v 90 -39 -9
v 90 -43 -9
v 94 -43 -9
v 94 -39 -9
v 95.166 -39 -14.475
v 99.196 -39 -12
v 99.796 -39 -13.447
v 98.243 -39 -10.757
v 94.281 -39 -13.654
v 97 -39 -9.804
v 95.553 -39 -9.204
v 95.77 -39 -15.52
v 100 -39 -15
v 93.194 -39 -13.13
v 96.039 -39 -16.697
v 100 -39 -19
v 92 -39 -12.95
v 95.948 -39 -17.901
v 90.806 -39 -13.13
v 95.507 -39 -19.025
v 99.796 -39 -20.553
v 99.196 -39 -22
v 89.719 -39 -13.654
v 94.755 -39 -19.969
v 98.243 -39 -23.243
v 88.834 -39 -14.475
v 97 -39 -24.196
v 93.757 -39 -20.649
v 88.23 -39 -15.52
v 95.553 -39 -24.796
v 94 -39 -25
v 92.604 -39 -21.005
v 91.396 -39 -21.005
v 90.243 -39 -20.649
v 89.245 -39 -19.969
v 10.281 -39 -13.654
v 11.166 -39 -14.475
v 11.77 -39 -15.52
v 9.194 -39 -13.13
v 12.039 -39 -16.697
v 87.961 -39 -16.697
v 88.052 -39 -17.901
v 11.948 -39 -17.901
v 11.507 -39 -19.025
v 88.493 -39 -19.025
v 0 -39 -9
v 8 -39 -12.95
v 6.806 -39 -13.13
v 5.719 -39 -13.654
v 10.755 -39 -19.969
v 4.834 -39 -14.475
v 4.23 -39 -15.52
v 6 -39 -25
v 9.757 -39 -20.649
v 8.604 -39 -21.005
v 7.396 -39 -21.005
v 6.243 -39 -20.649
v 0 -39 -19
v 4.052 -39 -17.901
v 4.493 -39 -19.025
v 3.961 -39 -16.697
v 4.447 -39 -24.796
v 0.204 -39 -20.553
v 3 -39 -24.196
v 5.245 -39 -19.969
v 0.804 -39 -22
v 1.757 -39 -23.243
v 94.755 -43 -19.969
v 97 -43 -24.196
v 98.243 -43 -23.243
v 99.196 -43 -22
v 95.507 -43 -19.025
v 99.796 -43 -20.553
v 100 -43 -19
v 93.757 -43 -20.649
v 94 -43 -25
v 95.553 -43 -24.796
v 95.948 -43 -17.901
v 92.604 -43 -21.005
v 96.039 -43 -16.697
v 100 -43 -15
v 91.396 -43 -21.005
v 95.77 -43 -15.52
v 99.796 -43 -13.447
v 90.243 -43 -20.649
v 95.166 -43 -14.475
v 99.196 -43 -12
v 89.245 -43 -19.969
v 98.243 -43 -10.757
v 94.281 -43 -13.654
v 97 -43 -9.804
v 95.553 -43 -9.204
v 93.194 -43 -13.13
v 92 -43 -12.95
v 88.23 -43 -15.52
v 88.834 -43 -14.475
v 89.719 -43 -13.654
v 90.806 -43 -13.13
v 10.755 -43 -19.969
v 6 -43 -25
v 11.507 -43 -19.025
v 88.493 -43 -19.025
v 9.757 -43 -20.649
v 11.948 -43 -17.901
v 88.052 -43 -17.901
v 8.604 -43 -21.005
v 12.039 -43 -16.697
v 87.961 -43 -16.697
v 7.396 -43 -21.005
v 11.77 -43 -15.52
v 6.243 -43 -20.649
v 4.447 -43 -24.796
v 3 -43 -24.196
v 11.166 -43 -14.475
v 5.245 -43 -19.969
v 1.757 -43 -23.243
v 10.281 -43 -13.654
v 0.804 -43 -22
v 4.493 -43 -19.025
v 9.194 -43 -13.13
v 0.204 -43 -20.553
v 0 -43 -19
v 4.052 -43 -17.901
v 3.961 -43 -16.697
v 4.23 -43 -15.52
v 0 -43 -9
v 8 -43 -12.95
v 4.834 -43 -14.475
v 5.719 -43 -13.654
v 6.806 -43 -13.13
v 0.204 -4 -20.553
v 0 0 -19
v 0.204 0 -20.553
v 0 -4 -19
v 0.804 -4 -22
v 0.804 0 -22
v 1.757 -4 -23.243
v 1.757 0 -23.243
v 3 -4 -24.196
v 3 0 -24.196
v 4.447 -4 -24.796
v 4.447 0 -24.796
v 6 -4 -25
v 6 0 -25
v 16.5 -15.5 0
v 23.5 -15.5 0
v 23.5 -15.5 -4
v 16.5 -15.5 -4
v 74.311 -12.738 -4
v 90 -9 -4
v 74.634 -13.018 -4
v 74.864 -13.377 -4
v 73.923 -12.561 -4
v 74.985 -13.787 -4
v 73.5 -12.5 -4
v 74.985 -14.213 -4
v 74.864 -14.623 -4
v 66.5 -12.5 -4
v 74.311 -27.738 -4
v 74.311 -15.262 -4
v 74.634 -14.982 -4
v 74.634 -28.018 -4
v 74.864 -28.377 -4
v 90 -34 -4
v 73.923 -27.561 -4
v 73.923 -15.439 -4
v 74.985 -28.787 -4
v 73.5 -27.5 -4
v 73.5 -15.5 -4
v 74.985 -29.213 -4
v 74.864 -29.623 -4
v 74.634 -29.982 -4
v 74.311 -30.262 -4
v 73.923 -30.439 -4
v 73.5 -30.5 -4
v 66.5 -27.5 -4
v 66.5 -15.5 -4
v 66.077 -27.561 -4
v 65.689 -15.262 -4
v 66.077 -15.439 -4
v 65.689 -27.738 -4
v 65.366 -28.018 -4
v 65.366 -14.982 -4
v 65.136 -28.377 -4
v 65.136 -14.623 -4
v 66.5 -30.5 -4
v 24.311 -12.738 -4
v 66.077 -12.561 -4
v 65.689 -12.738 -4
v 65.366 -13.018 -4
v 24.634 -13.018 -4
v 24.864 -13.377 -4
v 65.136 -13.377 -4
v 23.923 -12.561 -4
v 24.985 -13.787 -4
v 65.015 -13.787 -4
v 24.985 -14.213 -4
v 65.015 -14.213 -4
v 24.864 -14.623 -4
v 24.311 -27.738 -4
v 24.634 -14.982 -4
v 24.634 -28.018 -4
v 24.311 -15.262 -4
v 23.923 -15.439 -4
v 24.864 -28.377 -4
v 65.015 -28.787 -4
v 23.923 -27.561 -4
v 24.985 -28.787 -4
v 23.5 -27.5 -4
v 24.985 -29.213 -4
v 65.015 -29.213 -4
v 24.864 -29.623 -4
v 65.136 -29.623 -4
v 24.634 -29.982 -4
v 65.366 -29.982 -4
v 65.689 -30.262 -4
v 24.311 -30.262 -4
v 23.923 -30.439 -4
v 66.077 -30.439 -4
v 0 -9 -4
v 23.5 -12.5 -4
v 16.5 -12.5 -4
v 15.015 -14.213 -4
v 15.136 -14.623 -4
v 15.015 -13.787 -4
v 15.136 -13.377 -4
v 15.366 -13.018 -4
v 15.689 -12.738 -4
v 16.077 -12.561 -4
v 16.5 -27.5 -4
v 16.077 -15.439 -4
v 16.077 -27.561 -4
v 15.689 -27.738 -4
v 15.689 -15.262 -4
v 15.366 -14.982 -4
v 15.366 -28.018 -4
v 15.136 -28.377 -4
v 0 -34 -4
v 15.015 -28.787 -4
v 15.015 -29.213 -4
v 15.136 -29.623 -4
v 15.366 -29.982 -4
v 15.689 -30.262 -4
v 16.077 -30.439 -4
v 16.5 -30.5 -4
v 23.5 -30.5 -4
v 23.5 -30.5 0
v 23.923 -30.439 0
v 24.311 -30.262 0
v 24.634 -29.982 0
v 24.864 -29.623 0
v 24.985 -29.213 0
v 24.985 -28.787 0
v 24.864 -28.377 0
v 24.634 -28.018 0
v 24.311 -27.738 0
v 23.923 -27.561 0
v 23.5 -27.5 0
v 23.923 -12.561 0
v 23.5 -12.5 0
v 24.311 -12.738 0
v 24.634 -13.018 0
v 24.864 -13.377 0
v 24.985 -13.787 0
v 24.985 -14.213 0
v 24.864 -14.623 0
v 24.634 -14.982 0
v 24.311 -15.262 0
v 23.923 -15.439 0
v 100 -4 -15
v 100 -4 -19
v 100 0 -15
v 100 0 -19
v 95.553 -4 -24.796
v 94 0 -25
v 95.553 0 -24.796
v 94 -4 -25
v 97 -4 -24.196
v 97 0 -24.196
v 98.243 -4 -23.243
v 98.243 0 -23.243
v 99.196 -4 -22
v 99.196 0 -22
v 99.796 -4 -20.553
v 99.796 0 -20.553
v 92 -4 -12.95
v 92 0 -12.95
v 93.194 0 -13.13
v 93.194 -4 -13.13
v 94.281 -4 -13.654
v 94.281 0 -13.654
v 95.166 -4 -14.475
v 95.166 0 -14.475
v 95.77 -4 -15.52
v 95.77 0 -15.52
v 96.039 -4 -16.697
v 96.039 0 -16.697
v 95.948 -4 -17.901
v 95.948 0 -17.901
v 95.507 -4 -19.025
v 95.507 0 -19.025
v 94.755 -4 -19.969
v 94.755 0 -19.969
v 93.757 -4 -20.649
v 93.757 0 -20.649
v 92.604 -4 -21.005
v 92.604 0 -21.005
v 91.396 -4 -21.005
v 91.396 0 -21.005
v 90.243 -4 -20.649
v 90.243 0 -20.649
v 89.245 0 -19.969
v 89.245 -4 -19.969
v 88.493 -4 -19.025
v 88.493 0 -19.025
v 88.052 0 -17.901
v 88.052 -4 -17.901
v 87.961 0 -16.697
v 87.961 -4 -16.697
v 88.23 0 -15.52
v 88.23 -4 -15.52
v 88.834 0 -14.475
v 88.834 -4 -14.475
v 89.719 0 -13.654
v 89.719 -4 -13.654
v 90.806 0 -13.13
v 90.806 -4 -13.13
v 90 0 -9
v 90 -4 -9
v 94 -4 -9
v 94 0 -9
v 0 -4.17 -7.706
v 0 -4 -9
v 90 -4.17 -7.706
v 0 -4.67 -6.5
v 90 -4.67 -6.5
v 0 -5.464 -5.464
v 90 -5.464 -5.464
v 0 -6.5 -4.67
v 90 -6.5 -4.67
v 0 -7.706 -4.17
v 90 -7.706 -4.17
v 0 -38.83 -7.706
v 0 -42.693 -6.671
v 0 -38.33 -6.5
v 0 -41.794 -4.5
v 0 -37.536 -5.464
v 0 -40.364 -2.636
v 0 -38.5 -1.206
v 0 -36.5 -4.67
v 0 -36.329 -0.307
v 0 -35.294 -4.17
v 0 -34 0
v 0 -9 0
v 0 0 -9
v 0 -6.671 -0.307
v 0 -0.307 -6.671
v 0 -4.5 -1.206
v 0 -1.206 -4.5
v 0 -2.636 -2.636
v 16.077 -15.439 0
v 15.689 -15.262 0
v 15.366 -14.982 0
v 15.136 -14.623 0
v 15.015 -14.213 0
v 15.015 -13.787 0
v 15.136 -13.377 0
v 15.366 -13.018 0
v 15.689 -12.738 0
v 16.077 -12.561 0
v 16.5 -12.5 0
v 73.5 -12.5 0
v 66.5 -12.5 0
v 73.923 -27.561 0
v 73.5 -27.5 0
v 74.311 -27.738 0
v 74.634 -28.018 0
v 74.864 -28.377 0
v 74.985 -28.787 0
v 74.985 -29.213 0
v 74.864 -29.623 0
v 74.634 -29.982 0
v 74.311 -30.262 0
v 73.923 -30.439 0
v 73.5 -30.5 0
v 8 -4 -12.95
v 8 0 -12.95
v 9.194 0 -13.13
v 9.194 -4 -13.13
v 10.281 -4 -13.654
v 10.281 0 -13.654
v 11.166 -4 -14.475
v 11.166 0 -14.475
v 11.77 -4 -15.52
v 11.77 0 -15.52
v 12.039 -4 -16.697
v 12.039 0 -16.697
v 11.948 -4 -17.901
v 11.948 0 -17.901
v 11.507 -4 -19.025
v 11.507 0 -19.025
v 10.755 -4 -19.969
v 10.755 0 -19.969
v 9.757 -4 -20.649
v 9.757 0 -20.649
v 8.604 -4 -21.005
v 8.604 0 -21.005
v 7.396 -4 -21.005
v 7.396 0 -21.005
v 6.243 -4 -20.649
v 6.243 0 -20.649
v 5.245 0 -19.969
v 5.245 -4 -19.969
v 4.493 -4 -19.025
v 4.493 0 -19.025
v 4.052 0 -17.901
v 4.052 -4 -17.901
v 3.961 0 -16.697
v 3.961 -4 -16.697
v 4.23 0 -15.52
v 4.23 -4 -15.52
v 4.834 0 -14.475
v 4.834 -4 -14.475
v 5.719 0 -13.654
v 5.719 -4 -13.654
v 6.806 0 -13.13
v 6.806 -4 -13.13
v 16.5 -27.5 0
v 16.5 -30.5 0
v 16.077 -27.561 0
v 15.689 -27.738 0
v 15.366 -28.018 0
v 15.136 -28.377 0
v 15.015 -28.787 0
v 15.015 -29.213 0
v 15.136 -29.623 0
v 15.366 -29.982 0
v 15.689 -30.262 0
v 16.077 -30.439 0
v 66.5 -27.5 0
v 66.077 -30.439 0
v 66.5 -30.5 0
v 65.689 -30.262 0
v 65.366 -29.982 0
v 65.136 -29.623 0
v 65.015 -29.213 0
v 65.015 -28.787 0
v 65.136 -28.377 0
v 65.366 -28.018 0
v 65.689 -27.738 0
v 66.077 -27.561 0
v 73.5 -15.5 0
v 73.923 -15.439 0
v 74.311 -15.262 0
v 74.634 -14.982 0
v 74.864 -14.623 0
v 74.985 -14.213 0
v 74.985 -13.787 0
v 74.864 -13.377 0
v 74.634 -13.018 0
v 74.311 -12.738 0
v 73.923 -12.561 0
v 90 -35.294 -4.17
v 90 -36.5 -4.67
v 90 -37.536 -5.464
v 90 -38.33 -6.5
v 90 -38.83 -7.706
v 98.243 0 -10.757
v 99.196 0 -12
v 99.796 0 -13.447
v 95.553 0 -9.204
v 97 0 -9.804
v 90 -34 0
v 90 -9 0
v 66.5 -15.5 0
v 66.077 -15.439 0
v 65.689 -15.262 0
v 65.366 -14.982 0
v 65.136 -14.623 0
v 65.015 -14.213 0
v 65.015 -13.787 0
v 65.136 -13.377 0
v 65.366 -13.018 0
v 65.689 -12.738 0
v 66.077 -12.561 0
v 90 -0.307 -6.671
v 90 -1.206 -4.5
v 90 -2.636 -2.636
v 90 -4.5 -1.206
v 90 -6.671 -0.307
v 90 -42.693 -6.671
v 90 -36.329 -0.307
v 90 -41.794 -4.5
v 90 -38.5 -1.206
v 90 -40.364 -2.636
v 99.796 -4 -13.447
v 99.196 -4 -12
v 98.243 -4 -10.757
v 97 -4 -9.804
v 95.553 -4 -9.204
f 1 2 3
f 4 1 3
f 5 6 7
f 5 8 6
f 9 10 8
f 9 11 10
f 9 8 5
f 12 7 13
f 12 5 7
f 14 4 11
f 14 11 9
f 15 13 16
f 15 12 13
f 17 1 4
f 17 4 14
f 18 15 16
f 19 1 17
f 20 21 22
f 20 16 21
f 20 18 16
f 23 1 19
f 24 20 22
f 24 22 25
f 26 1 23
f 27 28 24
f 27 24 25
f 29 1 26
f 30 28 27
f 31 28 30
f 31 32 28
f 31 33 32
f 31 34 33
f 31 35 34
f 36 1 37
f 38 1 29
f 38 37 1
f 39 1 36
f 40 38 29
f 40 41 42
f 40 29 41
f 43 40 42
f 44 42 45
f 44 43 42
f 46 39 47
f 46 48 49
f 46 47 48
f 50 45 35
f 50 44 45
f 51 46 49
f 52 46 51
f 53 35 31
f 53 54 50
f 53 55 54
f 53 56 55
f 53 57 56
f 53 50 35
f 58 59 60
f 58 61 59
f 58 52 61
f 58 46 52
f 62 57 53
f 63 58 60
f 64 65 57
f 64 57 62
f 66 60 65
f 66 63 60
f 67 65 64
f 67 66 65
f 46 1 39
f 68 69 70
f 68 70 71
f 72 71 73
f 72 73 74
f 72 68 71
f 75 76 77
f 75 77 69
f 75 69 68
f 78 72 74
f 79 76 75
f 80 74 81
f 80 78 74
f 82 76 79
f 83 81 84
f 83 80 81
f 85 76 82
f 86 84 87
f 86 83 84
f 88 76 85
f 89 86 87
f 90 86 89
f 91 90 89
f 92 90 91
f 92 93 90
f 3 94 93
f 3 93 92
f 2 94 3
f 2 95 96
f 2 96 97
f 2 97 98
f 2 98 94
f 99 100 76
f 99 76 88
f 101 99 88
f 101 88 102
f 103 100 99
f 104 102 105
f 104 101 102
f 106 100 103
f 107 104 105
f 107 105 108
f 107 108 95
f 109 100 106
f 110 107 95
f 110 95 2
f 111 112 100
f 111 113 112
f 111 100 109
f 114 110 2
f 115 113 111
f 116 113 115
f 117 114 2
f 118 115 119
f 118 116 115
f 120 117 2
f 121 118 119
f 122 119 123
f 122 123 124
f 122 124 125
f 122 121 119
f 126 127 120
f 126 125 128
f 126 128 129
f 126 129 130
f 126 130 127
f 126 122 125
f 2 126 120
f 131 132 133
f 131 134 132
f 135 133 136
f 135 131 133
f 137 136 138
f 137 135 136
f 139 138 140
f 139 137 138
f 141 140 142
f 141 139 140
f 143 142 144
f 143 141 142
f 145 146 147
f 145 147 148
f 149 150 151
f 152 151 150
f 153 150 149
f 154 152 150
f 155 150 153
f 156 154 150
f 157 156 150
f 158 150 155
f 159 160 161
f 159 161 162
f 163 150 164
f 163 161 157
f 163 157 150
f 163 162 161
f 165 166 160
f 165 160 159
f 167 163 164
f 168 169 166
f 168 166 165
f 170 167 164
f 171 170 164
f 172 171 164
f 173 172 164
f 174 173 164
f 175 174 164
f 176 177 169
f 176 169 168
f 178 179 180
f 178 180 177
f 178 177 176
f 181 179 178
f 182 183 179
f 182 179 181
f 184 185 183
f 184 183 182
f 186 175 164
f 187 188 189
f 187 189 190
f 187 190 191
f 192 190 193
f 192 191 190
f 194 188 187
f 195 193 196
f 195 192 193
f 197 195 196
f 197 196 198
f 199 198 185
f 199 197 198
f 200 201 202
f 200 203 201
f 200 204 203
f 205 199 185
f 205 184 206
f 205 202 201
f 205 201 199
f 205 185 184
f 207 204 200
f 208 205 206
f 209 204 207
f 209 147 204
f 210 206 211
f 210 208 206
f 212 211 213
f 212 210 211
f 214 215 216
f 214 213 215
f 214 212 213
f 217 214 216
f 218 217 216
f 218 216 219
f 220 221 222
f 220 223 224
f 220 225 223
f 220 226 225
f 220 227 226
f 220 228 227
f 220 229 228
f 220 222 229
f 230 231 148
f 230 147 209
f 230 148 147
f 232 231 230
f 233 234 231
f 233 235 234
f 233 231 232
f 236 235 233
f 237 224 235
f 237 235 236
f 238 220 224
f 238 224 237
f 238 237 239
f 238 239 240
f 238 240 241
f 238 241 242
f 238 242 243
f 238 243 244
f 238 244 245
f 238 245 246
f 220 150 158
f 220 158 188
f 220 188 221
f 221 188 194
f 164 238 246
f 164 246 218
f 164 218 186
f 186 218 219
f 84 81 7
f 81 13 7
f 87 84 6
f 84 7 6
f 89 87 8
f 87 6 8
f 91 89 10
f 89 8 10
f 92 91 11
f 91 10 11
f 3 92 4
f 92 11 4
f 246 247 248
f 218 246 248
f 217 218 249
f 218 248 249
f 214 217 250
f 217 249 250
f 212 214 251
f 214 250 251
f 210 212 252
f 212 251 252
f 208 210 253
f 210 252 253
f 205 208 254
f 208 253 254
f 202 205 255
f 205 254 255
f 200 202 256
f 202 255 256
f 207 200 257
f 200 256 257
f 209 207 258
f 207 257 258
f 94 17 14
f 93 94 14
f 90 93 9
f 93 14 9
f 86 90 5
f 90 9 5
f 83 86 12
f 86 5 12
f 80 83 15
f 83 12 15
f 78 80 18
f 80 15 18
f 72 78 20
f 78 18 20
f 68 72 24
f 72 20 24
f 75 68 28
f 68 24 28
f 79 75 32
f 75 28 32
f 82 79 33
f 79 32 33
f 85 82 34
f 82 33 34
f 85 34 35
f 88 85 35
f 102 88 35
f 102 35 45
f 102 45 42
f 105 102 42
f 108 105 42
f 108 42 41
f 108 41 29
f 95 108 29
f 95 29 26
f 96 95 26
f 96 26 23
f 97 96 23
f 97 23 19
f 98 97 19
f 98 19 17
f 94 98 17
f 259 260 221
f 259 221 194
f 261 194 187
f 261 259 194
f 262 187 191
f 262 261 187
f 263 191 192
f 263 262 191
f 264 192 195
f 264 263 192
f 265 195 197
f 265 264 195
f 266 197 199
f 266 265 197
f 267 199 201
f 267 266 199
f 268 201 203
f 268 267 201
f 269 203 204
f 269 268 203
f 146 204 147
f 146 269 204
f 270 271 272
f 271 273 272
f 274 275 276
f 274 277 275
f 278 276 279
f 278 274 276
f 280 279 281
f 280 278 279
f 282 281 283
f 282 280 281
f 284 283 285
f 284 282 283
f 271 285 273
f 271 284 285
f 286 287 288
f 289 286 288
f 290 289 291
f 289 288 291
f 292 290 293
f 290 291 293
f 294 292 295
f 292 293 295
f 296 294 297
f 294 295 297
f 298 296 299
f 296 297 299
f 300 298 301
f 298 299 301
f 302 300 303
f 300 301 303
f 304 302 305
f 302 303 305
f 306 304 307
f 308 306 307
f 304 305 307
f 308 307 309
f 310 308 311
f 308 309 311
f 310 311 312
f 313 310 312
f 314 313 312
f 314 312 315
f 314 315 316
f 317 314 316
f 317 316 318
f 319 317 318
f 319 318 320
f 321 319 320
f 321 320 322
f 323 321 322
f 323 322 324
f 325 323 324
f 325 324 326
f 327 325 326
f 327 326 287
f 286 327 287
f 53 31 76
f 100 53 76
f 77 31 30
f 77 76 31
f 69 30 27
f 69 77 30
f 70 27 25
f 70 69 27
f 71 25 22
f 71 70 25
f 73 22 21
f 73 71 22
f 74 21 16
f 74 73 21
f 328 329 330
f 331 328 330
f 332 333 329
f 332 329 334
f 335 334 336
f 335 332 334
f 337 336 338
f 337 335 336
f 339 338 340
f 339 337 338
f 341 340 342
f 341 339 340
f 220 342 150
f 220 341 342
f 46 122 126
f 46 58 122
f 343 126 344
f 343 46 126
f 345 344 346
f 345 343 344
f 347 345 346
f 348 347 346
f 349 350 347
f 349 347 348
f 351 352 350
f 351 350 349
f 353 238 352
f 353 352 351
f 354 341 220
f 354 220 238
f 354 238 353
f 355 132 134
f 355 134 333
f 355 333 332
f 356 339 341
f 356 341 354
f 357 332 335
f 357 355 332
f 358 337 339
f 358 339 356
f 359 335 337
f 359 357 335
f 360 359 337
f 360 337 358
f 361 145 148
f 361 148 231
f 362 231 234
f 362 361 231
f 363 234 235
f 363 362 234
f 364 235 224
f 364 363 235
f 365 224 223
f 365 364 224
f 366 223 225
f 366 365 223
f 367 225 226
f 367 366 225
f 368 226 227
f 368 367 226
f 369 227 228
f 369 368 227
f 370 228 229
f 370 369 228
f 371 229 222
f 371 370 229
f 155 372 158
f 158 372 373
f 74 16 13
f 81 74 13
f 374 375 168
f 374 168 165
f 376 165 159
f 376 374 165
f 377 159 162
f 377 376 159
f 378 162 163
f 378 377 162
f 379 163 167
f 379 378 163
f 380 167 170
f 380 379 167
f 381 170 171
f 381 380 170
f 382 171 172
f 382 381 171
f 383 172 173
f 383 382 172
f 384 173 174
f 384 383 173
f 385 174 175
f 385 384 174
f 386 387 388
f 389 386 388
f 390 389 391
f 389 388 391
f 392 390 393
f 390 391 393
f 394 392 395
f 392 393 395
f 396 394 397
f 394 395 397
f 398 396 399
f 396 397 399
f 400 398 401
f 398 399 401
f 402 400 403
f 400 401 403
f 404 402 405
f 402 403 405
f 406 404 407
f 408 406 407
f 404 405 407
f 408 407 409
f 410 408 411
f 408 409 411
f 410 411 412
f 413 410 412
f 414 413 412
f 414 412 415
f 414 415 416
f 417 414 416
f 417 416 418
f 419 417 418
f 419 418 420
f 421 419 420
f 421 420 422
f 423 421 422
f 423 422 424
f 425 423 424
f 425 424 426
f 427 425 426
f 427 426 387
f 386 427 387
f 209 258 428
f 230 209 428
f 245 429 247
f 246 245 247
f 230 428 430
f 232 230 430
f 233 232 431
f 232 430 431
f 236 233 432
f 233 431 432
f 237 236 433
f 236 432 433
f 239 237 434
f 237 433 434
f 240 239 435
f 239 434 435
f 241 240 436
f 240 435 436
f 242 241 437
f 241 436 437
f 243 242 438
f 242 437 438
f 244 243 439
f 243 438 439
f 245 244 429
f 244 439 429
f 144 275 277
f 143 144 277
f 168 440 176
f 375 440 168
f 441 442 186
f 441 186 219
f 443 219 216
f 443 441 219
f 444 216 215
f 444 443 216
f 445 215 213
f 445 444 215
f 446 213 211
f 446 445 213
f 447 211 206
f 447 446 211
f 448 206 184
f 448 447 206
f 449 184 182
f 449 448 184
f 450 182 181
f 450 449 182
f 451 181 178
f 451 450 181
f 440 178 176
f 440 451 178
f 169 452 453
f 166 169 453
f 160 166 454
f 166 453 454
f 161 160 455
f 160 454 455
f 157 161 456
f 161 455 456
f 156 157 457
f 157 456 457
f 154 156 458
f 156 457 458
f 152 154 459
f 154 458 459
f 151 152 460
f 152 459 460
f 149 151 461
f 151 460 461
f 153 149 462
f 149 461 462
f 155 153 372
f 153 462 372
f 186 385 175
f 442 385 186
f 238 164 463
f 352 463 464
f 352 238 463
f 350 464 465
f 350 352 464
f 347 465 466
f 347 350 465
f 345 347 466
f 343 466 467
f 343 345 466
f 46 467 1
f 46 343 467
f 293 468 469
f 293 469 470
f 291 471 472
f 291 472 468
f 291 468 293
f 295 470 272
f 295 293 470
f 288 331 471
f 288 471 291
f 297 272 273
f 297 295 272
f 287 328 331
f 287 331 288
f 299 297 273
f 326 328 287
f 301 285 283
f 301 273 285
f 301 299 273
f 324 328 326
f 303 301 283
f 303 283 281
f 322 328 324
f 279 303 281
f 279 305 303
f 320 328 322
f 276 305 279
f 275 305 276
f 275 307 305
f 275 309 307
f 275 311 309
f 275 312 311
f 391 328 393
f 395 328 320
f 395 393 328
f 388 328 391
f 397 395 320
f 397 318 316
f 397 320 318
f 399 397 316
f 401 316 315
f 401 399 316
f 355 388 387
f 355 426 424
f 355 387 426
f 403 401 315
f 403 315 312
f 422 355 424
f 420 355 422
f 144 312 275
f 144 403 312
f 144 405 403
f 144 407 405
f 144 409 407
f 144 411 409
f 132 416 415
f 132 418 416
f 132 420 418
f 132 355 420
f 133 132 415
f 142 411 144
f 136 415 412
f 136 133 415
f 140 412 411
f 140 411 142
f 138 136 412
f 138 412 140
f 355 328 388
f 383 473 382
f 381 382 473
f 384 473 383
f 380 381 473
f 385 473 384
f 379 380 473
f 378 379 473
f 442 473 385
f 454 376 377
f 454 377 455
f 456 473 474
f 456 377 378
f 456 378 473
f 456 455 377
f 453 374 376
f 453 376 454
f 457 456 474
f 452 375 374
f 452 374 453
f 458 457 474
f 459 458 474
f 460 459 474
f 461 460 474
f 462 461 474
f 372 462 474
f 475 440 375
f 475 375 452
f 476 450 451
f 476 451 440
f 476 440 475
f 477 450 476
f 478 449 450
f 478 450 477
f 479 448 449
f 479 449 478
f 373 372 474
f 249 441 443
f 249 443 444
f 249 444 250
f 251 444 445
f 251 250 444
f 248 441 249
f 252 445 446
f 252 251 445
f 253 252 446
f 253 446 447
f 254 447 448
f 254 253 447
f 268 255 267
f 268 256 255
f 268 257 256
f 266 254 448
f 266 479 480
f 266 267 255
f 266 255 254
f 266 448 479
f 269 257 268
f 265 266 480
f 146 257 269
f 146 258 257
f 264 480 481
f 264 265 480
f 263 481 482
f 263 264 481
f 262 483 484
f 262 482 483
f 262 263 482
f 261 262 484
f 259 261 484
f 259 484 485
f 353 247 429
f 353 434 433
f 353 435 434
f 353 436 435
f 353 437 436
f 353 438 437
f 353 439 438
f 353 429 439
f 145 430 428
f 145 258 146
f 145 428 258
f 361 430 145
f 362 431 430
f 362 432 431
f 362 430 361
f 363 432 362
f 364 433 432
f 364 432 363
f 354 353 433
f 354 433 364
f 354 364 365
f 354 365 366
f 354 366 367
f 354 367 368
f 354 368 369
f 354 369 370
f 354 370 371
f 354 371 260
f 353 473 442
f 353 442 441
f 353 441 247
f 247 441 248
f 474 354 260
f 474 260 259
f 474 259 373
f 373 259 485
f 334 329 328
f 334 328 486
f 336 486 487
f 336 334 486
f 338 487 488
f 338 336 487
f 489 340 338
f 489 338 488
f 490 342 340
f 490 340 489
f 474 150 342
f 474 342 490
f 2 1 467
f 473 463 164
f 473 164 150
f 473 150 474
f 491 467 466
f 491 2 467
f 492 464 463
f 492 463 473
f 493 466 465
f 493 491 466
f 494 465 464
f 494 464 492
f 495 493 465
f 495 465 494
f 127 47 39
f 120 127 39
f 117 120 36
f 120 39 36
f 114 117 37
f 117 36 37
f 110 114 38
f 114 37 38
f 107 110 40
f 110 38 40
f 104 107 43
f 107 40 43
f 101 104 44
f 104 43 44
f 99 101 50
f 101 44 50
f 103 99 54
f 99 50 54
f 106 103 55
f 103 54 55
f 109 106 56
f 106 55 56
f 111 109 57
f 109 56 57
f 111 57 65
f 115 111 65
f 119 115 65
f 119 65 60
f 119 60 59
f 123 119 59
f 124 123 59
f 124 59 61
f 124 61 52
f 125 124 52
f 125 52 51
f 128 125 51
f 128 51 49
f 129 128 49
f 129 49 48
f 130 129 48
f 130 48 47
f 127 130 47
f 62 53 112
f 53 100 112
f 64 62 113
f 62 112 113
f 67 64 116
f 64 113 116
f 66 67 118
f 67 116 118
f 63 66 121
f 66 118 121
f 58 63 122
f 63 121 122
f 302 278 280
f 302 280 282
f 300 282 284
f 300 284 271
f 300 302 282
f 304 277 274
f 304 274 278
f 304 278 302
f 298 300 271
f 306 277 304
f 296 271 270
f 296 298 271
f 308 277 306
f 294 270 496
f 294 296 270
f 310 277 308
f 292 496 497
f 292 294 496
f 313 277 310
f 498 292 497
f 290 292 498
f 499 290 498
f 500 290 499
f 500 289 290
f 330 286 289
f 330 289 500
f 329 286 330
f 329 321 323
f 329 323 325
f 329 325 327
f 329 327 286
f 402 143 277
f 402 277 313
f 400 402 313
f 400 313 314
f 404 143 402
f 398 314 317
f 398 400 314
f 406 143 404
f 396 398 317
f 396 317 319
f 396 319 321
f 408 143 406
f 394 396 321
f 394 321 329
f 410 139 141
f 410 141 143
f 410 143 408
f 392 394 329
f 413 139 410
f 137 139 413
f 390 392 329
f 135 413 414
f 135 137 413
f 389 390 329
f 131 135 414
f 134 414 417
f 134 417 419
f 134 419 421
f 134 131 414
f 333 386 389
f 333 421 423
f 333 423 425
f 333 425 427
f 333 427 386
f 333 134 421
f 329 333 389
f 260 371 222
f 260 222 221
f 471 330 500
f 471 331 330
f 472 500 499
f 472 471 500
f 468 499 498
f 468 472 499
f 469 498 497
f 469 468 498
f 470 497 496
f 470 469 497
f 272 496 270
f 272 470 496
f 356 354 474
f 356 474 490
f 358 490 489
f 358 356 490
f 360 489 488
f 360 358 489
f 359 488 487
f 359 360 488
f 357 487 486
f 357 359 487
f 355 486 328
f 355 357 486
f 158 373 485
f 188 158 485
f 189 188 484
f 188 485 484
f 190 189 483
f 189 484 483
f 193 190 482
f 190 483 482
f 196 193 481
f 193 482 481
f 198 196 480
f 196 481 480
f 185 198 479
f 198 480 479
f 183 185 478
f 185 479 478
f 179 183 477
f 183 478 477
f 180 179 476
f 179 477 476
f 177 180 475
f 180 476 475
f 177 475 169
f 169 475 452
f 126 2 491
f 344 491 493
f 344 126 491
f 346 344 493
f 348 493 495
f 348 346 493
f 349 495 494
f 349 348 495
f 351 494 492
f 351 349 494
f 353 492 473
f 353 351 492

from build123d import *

# Parameters (mm, degrees)
SM_BASE_FLANGE_1_DEPTH = 100
SKETCH_4_R             = 4.05
CUT_EXTRUDE_1_DEPTH    = 112.687062814
SKETCH_5_W             = 10
SKETCH_5_H             = 9
CUT_EXTRUDE_2_DEPTH    = 112.687062814
FILLET_1_R             = 6
CUT_EXTRUDE_3_DEPTH    = 4


# Sheet-metal steps are written as plain solids
with BuildPart() as part:
    # Sketch 1 → Базовая кромка1 (new body)
    with BuildSketch(Plane(origin=(0, 0, 0), x_dir=(0, 0, -1), z_dir=(1, 0, 0))):
        with BuildLine():
            Line((25, -43), (9, -43))
            ThreePointArc((9, -43), (2.636038969, -40.363961031), (0, -34))
            Line((0, -34), (0, -9))
            ThreePointArc((0, -9), (2.636038969, -2.636038969), (9, 0))
            Line((9, 0), (25, 0))
            Line((25, 0), (25, -4))
            Line((25, -4), (9, -4))
            ThreePointArc((9, -4), (5.464466094, -5.464466094), (4, -9))
            Line((4, -9), (4, -34))
            ThreePointArc((4, -34), (5.464466094, -37.535533906), (9, -39))
            Line((9, -39), (25, -39))
            Line((25, -39), (25, -43))
        make_face()
    extrude(amount=SM_BASE_FLANGE_1_DEPTH)

    # Эскиз4 → Вырез-Вытянуть1 (cut, through all)
    with BuildSketch(Plane(origin=(0, 0, 0), x_dir=(1, 0, 0), z_dir=(0, 1, 0))):
        with Locations(Location((8, 17, 0), (0, 0, 270))):
            Circle(SKETCH_4_R)
        with Locations(Location((92, 17, 0), (0, 0, 270))):
            Circle(SKETCH_4_R)
    extrude(amount=-CUT_EXTRUDE_1_DEPTH, mode=Mode.SUBTRACT)

    # Эскиз5 → Вырез-Вытянуть2 (cut, through all)
    with BuildSketch(Plane.XZ.offset(43)):
        with Locations((95, -4.5)):
            Rectangle(SKETCH_5_W, SKETCH_5_H)
    extrude(amount=-CUT_EXTRUDE_2_DEPTH, mode=Mode.SUBTRACT)

    # Скругление1
    fillet_1_edges = [part.edges().sort_by_distance(p)[0] for p in [
        (0, -41, -25),
        (0, -2, -25),
        (100, -41, -25),
        (100, -2, -9),
        (100, -41, -9),
        (100, -2, -25),
    ]]
    fillet(fillet_1_edges, radius=FILLET_1_R)

    # Эскиз6 → Вырез-Вытянуть3 (cut)
    with BuildSketch(Plane.XY):
        with BuildLine():
            Line((16.5, -12.5), (23.5, -12.5))
            ThreePointArc((23.5, -12.5), (25, -14), (23.5, -15.5))
            Line((23.5, -15.5), (16.5, -15.5))
            ThreePointArc((16.5, -15.5), (15, -14), (16.5, -12.5))
        make_face()
        with BuildLine():
            Line((73.5, -12.5), (66.5, -12.5))
            ThreePointArc((66.5, -12.5), (65, -14), (66.5, -15.5))
            Line((66.5, -15.5), (73.5, -15.5))
            ThreePointArc((73.5, -15.5), (75, -14), (73.5, -12.5))
        make_face()
        with BuildLine():
            Line((73.5, -30.5), (66.5, -30.5))
            ThreePointArc((66.5, -30.5), (65, -29), (66.5, -27.5))
            Line((66.5, -27.5), (73.5, -27.5))
            ThreePointArc((73.5, -27.5), (75, -29), (73.5, -30.5))
        make_face()
        with BuildLine():
            Line((16.5, -30.5), (23.5, -30.5))
            ThreePointArc((23.5, -30.5), (25, -29), (23.5, -27.5))
            Line((23.5, -27.5), (16.5, -27.5))
            ThreePointArc((16.5, -27.5), (15, -29), (16.5, -30.5))
        make_face()
    extrude(amount=-CUT_EXTRUDE_3_DEPTH, mode=Mode.SUBTRACT)


solid = part.part
